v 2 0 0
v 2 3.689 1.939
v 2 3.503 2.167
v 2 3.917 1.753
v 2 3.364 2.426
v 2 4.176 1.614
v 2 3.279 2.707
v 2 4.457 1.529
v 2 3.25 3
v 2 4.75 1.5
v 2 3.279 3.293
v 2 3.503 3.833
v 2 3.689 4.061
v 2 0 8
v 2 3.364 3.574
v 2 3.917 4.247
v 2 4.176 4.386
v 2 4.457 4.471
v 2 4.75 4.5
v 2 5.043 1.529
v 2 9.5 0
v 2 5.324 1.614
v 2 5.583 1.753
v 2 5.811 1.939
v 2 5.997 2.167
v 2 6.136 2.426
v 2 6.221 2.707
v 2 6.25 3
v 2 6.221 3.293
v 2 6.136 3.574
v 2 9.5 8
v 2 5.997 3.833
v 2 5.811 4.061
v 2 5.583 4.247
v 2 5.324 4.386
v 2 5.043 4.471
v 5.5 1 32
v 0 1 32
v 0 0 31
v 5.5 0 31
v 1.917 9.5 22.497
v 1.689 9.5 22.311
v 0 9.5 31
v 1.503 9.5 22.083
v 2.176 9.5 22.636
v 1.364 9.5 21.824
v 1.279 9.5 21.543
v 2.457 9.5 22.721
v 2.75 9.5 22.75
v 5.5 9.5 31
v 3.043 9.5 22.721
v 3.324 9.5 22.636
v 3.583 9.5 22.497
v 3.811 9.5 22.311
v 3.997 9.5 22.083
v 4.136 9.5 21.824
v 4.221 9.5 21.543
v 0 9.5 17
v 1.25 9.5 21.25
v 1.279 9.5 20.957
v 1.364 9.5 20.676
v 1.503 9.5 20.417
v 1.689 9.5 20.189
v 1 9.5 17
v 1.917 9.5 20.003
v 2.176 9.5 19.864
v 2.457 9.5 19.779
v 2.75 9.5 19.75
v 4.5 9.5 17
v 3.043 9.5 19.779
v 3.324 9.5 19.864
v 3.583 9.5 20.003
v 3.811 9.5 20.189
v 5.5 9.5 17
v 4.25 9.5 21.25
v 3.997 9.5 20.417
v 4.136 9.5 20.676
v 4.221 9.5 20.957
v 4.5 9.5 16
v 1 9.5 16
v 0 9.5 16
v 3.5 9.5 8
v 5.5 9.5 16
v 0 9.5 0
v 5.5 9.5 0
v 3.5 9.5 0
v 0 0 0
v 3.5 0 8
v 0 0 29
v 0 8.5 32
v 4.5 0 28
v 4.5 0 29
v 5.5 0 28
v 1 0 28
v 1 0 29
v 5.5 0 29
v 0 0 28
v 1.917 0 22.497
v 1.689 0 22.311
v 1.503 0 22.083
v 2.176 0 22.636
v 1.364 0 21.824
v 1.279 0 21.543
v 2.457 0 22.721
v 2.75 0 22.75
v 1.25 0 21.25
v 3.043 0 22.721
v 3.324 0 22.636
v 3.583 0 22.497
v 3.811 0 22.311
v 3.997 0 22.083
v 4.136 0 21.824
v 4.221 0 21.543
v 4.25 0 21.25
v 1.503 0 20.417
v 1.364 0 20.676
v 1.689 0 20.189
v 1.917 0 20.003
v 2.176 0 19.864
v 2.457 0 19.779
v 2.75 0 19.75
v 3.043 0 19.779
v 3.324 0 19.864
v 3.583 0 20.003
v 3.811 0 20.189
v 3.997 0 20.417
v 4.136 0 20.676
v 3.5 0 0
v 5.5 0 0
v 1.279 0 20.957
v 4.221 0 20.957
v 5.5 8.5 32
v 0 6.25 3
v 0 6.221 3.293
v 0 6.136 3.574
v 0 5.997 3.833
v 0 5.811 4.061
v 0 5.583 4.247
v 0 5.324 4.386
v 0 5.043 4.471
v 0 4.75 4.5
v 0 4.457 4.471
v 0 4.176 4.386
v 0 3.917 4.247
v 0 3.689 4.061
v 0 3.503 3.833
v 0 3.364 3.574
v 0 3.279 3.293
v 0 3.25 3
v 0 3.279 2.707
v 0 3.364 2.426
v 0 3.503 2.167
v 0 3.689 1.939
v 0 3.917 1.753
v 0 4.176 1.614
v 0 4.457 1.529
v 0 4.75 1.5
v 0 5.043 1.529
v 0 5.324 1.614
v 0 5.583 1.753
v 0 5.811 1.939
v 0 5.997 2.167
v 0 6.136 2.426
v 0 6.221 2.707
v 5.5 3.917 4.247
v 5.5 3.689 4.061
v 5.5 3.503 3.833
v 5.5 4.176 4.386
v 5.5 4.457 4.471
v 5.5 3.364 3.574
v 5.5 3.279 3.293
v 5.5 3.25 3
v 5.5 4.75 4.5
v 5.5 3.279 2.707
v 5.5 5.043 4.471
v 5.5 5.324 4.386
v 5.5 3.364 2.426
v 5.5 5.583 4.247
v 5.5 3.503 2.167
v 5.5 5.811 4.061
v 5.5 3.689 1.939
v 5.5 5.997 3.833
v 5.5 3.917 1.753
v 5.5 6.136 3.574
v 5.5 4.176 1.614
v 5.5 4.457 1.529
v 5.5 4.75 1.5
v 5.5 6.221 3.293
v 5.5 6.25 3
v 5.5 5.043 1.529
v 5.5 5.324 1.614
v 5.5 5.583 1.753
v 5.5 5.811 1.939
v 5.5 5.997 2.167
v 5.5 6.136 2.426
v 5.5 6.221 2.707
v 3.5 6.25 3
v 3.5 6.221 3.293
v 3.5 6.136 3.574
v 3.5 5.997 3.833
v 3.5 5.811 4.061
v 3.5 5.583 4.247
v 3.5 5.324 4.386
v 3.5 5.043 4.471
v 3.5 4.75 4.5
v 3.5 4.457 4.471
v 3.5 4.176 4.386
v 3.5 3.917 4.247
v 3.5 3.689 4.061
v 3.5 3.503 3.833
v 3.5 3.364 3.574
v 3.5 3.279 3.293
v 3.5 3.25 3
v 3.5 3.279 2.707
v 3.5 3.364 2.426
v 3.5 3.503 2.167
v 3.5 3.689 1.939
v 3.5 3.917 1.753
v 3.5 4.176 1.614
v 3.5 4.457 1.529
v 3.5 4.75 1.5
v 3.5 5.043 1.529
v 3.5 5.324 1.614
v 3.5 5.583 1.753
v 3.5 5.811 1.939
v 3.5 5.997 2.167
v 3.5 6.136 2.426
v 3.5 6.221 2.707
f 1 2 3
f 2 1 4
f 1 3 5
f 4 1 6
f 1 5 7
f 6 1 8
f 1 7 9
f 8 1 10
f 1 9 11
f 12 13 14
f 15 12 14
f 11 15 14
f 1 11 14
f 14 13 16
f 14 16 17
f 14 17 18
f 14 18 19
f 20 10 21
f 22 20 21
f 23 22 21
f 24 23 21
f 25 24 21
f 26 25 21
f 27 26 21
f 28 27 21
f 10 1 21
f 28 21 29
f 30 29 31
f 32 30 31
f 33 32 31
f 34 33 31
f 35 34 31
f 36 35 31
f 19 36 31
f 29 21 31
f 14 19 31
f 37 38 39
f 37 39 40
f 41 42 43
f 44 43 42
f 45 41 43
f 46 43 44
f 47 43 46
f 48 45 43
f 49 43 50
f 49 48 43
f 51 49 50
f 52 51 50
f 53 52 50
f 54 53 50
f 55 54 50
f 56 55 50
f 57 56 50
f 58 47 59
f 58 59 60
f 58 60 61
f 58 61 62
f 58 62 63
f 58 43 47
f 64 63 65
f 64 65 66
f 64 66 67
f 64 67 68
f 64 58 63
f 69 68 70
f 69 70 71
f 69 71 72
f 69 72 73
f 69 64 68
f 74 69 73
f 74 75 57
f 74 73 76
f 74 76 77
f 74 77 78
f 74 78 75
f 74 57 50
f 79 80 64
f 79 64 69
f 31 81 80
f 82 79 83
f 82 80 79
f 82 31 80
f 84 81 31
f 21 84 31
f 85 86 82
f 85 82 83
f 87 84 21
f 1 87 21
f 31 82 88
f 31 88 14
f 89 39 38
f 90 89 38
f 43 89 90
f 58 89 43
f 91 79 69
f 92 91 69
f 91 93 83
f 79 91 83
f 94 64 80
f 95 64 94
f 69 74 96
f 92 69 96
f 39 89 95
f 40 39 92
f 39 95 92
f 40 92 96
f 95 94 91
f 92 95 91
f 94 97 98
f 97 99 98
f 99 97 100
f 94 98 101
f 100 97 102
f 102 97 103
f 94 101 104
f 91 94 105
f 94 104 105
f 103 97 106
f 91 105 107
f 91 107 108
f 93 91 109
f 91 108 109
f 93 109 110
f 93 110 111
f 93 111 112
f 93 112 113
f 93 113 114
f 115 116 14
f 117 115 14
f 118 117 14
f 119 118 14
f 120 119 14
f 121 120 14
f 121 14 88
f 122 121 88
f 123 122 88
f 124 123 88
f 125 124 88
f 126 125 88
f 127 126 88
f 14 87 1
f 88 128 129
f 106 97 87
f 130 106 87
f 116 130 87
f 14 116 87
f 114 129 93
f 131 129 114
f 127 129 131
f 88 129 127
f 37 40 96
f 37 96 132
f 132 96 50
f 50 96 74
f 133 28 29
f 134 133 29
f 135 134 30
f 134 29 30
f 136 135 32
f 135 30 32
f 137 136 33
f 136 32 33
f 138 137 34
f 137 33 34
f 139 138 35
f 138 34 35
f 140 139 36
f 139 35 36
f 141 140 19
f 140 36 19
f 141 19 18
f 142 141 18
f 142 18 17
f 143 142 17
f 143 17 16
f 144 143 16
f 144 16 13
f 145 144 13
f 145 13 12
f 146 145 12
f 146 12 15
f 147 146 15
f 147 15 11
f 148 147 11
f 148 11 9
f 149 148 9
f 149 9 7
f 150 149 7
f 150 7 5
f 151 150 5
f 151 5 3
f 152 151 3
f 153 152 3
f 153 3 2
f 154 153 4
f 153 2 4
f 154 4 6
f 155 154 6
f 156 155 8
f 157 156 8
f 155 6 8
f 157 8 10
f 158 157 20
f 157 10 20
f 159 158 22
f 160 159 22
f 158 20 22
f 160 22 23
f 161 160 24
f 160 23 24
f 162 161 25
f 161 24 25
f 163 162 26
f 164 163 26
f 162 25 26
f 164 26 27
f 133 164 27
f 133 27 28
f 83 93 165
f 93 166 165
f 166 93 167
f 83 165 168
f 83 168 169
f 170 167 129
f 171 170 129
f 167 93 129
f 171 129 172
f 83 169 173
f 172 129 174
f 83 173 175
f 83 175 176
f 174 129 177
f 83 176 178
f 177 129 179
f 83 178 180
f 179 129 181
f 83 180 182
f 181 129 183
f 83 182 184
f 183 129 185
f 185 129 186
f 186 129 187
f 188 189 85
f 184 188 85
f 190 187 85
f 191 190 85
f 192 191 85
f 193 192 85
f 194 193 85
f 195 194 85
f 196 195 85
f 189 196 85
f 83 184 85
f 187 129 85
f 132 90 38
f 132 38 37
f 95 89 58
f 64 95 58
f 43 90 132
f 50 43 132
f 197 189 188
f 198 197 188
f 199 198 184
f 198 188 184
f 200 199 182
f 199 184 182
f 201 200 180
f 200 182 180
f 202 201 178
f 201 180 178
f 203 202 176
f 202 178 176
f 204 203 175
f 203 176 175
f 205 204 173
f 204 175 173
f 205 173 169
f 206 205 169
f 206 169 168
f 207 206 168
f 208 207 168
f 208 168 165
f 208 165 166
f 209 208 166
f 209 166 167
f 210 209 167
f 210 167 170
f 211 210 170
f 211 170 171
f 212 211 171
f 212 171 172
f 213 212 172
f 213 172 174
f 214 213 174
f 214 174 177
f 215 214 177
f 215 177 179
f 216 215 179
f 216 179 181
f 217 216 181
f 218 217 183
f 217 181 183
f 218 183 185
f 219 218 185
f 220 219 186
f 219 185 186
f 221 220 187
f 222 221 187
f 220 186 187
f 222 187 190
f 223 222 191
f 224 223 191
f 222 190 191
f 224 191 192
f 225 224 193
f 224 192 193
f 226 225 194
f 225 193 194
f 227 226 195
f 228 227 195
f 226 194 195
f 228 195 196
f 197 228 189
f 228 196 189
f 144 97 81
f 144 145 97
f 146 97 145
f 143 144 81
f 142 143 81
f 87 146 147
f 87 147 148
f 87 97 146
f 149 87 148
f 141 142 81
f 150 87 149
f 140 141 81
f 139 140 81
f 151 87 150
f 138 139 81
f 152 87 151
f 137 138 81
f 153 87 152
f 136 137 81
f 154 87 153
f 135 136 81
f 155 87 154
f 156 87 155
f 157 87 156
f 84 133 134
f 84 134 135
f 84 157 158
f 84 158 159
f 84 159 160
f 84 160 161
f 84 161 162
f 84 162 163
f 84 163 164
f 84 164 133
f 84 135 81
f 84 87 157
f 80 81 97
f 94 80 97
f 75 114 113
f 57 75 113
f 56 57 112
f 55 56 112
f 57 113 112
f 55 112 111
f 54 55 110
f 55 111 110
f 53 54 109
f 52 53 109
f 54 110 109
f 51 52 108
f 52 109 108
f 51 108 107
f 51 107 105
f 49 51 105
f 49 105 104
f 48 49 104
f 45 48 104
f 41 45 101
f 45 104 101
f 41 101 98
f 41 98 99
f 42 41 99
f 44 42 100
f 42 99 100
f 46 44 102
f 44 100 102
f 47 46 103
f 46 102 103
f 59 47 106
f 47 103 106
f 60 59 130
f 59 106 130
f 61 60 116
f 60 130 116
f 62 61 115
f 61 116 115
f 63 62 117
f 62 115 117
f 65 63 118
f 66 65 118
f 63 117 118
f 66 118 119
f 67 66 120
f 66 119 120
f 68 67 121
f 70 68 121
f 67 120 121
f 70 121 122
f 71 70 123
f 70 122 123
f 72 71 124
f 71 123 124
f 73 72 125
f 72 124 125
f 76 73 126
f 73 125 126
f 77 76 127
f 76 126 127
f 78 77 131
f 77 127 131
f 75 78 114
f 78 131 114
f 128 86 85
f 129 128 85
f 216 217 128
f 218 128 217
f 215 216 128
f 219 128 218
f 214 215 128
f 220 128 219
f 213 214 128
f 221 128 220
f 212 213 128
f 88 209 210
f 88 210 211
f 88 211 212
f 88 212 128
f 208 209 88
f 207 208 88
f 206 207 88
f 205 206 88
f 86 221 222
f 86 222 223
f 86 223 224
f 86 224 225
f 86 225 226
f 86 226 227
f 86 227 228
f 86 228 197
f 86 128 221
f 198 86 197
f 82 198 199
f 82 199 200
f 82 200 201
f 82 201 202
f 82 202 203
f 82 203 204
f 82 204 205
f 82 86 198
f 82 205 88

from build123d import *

# Parameters (mm, degrees)
F0_W      = 5.5
F0_H      = 9.5
F1_DEPTH  = 32
F2_SIZE   = 1
F3_R      = 1.5
F4_DEPTH  = 5.5
F5_W      = 1.5
F5_H      = 8
F6_DEPTH  = 9.5
F8_DEPTH  = 1
F10_DEPTH = 1
F11_R     = 1.5
F12_DEPTH = 9.5


with BuildPart() as f1:
    # F0 (on Top) → F1 (new body)
    with BuildSketch(Plane.XY):
        with Locations((2.75, 4.75)):
            Rectangle(F0_W, F0_H)
    extrude(amount=F1_DEPTH)

    # F2
    f2_edges = [f1.edges().sort_by_distance(p)[0] for p in [
        (2.75, 0, 32),
        (2.75, 9.5, 32),
    ]]
    chamfer(f2_edges, length=F2_SIZE)

    # F3 (on face) → F4 (cut, through all)
    with BuildSketch(Plane.YZ.offset(5.5)):
        with Locations((4.75, 3)):
            Circle(F3_R)
    extrude(amount=-F4_DEPTH, mode=Mode.SUBTRACT)

    # F5 (on face) → F6 (cut, through all)
    with BuildSketch(Plane(origin=(0, 9.5, 0), x_dir=(-1, 0, 0), z_dir=(0, 1, 0))):
        with Locations((-2.75, 4)):
            Rectangle(F5_W, F5_H)
    extrude(amount=-F6_DEPTH, mode=Mode.SUBTRACT)

    # F7 (on face) → F8 (cut)
    with BuildSketch(Plane.YZ.offset(5.5)):
        Polygon((9.5, 17), (0, 29), (0, 28), (9.5, 16), align=None)
    extrude(amount=-F8_DEPTH, mode=Mode.SUBTRACT)

    # F9 (on face) → F10 (cut)
    with BuildSketch(Plane(origin=(0, 0, 0), x_dir=(0, -1, 0), z_dir=(-1, 0, 0))):
        Polygon((0, 28), (0, 29), (-9.5, 17), (-9.5, 16), align=None)
    extrude(amount=-F10_DEPTH, mode=Mode.SUBTRACT)

    # F11 (on face) → F12 (cut, through all)
    with BuildSketch(Plane.XZ):
        with Locations((2.75, 21.25)):
            Circle(F11_R)
    extrude(amount=-F12_DEPTH, mode=Mode.SUBTRACT)


solid = f1.part
